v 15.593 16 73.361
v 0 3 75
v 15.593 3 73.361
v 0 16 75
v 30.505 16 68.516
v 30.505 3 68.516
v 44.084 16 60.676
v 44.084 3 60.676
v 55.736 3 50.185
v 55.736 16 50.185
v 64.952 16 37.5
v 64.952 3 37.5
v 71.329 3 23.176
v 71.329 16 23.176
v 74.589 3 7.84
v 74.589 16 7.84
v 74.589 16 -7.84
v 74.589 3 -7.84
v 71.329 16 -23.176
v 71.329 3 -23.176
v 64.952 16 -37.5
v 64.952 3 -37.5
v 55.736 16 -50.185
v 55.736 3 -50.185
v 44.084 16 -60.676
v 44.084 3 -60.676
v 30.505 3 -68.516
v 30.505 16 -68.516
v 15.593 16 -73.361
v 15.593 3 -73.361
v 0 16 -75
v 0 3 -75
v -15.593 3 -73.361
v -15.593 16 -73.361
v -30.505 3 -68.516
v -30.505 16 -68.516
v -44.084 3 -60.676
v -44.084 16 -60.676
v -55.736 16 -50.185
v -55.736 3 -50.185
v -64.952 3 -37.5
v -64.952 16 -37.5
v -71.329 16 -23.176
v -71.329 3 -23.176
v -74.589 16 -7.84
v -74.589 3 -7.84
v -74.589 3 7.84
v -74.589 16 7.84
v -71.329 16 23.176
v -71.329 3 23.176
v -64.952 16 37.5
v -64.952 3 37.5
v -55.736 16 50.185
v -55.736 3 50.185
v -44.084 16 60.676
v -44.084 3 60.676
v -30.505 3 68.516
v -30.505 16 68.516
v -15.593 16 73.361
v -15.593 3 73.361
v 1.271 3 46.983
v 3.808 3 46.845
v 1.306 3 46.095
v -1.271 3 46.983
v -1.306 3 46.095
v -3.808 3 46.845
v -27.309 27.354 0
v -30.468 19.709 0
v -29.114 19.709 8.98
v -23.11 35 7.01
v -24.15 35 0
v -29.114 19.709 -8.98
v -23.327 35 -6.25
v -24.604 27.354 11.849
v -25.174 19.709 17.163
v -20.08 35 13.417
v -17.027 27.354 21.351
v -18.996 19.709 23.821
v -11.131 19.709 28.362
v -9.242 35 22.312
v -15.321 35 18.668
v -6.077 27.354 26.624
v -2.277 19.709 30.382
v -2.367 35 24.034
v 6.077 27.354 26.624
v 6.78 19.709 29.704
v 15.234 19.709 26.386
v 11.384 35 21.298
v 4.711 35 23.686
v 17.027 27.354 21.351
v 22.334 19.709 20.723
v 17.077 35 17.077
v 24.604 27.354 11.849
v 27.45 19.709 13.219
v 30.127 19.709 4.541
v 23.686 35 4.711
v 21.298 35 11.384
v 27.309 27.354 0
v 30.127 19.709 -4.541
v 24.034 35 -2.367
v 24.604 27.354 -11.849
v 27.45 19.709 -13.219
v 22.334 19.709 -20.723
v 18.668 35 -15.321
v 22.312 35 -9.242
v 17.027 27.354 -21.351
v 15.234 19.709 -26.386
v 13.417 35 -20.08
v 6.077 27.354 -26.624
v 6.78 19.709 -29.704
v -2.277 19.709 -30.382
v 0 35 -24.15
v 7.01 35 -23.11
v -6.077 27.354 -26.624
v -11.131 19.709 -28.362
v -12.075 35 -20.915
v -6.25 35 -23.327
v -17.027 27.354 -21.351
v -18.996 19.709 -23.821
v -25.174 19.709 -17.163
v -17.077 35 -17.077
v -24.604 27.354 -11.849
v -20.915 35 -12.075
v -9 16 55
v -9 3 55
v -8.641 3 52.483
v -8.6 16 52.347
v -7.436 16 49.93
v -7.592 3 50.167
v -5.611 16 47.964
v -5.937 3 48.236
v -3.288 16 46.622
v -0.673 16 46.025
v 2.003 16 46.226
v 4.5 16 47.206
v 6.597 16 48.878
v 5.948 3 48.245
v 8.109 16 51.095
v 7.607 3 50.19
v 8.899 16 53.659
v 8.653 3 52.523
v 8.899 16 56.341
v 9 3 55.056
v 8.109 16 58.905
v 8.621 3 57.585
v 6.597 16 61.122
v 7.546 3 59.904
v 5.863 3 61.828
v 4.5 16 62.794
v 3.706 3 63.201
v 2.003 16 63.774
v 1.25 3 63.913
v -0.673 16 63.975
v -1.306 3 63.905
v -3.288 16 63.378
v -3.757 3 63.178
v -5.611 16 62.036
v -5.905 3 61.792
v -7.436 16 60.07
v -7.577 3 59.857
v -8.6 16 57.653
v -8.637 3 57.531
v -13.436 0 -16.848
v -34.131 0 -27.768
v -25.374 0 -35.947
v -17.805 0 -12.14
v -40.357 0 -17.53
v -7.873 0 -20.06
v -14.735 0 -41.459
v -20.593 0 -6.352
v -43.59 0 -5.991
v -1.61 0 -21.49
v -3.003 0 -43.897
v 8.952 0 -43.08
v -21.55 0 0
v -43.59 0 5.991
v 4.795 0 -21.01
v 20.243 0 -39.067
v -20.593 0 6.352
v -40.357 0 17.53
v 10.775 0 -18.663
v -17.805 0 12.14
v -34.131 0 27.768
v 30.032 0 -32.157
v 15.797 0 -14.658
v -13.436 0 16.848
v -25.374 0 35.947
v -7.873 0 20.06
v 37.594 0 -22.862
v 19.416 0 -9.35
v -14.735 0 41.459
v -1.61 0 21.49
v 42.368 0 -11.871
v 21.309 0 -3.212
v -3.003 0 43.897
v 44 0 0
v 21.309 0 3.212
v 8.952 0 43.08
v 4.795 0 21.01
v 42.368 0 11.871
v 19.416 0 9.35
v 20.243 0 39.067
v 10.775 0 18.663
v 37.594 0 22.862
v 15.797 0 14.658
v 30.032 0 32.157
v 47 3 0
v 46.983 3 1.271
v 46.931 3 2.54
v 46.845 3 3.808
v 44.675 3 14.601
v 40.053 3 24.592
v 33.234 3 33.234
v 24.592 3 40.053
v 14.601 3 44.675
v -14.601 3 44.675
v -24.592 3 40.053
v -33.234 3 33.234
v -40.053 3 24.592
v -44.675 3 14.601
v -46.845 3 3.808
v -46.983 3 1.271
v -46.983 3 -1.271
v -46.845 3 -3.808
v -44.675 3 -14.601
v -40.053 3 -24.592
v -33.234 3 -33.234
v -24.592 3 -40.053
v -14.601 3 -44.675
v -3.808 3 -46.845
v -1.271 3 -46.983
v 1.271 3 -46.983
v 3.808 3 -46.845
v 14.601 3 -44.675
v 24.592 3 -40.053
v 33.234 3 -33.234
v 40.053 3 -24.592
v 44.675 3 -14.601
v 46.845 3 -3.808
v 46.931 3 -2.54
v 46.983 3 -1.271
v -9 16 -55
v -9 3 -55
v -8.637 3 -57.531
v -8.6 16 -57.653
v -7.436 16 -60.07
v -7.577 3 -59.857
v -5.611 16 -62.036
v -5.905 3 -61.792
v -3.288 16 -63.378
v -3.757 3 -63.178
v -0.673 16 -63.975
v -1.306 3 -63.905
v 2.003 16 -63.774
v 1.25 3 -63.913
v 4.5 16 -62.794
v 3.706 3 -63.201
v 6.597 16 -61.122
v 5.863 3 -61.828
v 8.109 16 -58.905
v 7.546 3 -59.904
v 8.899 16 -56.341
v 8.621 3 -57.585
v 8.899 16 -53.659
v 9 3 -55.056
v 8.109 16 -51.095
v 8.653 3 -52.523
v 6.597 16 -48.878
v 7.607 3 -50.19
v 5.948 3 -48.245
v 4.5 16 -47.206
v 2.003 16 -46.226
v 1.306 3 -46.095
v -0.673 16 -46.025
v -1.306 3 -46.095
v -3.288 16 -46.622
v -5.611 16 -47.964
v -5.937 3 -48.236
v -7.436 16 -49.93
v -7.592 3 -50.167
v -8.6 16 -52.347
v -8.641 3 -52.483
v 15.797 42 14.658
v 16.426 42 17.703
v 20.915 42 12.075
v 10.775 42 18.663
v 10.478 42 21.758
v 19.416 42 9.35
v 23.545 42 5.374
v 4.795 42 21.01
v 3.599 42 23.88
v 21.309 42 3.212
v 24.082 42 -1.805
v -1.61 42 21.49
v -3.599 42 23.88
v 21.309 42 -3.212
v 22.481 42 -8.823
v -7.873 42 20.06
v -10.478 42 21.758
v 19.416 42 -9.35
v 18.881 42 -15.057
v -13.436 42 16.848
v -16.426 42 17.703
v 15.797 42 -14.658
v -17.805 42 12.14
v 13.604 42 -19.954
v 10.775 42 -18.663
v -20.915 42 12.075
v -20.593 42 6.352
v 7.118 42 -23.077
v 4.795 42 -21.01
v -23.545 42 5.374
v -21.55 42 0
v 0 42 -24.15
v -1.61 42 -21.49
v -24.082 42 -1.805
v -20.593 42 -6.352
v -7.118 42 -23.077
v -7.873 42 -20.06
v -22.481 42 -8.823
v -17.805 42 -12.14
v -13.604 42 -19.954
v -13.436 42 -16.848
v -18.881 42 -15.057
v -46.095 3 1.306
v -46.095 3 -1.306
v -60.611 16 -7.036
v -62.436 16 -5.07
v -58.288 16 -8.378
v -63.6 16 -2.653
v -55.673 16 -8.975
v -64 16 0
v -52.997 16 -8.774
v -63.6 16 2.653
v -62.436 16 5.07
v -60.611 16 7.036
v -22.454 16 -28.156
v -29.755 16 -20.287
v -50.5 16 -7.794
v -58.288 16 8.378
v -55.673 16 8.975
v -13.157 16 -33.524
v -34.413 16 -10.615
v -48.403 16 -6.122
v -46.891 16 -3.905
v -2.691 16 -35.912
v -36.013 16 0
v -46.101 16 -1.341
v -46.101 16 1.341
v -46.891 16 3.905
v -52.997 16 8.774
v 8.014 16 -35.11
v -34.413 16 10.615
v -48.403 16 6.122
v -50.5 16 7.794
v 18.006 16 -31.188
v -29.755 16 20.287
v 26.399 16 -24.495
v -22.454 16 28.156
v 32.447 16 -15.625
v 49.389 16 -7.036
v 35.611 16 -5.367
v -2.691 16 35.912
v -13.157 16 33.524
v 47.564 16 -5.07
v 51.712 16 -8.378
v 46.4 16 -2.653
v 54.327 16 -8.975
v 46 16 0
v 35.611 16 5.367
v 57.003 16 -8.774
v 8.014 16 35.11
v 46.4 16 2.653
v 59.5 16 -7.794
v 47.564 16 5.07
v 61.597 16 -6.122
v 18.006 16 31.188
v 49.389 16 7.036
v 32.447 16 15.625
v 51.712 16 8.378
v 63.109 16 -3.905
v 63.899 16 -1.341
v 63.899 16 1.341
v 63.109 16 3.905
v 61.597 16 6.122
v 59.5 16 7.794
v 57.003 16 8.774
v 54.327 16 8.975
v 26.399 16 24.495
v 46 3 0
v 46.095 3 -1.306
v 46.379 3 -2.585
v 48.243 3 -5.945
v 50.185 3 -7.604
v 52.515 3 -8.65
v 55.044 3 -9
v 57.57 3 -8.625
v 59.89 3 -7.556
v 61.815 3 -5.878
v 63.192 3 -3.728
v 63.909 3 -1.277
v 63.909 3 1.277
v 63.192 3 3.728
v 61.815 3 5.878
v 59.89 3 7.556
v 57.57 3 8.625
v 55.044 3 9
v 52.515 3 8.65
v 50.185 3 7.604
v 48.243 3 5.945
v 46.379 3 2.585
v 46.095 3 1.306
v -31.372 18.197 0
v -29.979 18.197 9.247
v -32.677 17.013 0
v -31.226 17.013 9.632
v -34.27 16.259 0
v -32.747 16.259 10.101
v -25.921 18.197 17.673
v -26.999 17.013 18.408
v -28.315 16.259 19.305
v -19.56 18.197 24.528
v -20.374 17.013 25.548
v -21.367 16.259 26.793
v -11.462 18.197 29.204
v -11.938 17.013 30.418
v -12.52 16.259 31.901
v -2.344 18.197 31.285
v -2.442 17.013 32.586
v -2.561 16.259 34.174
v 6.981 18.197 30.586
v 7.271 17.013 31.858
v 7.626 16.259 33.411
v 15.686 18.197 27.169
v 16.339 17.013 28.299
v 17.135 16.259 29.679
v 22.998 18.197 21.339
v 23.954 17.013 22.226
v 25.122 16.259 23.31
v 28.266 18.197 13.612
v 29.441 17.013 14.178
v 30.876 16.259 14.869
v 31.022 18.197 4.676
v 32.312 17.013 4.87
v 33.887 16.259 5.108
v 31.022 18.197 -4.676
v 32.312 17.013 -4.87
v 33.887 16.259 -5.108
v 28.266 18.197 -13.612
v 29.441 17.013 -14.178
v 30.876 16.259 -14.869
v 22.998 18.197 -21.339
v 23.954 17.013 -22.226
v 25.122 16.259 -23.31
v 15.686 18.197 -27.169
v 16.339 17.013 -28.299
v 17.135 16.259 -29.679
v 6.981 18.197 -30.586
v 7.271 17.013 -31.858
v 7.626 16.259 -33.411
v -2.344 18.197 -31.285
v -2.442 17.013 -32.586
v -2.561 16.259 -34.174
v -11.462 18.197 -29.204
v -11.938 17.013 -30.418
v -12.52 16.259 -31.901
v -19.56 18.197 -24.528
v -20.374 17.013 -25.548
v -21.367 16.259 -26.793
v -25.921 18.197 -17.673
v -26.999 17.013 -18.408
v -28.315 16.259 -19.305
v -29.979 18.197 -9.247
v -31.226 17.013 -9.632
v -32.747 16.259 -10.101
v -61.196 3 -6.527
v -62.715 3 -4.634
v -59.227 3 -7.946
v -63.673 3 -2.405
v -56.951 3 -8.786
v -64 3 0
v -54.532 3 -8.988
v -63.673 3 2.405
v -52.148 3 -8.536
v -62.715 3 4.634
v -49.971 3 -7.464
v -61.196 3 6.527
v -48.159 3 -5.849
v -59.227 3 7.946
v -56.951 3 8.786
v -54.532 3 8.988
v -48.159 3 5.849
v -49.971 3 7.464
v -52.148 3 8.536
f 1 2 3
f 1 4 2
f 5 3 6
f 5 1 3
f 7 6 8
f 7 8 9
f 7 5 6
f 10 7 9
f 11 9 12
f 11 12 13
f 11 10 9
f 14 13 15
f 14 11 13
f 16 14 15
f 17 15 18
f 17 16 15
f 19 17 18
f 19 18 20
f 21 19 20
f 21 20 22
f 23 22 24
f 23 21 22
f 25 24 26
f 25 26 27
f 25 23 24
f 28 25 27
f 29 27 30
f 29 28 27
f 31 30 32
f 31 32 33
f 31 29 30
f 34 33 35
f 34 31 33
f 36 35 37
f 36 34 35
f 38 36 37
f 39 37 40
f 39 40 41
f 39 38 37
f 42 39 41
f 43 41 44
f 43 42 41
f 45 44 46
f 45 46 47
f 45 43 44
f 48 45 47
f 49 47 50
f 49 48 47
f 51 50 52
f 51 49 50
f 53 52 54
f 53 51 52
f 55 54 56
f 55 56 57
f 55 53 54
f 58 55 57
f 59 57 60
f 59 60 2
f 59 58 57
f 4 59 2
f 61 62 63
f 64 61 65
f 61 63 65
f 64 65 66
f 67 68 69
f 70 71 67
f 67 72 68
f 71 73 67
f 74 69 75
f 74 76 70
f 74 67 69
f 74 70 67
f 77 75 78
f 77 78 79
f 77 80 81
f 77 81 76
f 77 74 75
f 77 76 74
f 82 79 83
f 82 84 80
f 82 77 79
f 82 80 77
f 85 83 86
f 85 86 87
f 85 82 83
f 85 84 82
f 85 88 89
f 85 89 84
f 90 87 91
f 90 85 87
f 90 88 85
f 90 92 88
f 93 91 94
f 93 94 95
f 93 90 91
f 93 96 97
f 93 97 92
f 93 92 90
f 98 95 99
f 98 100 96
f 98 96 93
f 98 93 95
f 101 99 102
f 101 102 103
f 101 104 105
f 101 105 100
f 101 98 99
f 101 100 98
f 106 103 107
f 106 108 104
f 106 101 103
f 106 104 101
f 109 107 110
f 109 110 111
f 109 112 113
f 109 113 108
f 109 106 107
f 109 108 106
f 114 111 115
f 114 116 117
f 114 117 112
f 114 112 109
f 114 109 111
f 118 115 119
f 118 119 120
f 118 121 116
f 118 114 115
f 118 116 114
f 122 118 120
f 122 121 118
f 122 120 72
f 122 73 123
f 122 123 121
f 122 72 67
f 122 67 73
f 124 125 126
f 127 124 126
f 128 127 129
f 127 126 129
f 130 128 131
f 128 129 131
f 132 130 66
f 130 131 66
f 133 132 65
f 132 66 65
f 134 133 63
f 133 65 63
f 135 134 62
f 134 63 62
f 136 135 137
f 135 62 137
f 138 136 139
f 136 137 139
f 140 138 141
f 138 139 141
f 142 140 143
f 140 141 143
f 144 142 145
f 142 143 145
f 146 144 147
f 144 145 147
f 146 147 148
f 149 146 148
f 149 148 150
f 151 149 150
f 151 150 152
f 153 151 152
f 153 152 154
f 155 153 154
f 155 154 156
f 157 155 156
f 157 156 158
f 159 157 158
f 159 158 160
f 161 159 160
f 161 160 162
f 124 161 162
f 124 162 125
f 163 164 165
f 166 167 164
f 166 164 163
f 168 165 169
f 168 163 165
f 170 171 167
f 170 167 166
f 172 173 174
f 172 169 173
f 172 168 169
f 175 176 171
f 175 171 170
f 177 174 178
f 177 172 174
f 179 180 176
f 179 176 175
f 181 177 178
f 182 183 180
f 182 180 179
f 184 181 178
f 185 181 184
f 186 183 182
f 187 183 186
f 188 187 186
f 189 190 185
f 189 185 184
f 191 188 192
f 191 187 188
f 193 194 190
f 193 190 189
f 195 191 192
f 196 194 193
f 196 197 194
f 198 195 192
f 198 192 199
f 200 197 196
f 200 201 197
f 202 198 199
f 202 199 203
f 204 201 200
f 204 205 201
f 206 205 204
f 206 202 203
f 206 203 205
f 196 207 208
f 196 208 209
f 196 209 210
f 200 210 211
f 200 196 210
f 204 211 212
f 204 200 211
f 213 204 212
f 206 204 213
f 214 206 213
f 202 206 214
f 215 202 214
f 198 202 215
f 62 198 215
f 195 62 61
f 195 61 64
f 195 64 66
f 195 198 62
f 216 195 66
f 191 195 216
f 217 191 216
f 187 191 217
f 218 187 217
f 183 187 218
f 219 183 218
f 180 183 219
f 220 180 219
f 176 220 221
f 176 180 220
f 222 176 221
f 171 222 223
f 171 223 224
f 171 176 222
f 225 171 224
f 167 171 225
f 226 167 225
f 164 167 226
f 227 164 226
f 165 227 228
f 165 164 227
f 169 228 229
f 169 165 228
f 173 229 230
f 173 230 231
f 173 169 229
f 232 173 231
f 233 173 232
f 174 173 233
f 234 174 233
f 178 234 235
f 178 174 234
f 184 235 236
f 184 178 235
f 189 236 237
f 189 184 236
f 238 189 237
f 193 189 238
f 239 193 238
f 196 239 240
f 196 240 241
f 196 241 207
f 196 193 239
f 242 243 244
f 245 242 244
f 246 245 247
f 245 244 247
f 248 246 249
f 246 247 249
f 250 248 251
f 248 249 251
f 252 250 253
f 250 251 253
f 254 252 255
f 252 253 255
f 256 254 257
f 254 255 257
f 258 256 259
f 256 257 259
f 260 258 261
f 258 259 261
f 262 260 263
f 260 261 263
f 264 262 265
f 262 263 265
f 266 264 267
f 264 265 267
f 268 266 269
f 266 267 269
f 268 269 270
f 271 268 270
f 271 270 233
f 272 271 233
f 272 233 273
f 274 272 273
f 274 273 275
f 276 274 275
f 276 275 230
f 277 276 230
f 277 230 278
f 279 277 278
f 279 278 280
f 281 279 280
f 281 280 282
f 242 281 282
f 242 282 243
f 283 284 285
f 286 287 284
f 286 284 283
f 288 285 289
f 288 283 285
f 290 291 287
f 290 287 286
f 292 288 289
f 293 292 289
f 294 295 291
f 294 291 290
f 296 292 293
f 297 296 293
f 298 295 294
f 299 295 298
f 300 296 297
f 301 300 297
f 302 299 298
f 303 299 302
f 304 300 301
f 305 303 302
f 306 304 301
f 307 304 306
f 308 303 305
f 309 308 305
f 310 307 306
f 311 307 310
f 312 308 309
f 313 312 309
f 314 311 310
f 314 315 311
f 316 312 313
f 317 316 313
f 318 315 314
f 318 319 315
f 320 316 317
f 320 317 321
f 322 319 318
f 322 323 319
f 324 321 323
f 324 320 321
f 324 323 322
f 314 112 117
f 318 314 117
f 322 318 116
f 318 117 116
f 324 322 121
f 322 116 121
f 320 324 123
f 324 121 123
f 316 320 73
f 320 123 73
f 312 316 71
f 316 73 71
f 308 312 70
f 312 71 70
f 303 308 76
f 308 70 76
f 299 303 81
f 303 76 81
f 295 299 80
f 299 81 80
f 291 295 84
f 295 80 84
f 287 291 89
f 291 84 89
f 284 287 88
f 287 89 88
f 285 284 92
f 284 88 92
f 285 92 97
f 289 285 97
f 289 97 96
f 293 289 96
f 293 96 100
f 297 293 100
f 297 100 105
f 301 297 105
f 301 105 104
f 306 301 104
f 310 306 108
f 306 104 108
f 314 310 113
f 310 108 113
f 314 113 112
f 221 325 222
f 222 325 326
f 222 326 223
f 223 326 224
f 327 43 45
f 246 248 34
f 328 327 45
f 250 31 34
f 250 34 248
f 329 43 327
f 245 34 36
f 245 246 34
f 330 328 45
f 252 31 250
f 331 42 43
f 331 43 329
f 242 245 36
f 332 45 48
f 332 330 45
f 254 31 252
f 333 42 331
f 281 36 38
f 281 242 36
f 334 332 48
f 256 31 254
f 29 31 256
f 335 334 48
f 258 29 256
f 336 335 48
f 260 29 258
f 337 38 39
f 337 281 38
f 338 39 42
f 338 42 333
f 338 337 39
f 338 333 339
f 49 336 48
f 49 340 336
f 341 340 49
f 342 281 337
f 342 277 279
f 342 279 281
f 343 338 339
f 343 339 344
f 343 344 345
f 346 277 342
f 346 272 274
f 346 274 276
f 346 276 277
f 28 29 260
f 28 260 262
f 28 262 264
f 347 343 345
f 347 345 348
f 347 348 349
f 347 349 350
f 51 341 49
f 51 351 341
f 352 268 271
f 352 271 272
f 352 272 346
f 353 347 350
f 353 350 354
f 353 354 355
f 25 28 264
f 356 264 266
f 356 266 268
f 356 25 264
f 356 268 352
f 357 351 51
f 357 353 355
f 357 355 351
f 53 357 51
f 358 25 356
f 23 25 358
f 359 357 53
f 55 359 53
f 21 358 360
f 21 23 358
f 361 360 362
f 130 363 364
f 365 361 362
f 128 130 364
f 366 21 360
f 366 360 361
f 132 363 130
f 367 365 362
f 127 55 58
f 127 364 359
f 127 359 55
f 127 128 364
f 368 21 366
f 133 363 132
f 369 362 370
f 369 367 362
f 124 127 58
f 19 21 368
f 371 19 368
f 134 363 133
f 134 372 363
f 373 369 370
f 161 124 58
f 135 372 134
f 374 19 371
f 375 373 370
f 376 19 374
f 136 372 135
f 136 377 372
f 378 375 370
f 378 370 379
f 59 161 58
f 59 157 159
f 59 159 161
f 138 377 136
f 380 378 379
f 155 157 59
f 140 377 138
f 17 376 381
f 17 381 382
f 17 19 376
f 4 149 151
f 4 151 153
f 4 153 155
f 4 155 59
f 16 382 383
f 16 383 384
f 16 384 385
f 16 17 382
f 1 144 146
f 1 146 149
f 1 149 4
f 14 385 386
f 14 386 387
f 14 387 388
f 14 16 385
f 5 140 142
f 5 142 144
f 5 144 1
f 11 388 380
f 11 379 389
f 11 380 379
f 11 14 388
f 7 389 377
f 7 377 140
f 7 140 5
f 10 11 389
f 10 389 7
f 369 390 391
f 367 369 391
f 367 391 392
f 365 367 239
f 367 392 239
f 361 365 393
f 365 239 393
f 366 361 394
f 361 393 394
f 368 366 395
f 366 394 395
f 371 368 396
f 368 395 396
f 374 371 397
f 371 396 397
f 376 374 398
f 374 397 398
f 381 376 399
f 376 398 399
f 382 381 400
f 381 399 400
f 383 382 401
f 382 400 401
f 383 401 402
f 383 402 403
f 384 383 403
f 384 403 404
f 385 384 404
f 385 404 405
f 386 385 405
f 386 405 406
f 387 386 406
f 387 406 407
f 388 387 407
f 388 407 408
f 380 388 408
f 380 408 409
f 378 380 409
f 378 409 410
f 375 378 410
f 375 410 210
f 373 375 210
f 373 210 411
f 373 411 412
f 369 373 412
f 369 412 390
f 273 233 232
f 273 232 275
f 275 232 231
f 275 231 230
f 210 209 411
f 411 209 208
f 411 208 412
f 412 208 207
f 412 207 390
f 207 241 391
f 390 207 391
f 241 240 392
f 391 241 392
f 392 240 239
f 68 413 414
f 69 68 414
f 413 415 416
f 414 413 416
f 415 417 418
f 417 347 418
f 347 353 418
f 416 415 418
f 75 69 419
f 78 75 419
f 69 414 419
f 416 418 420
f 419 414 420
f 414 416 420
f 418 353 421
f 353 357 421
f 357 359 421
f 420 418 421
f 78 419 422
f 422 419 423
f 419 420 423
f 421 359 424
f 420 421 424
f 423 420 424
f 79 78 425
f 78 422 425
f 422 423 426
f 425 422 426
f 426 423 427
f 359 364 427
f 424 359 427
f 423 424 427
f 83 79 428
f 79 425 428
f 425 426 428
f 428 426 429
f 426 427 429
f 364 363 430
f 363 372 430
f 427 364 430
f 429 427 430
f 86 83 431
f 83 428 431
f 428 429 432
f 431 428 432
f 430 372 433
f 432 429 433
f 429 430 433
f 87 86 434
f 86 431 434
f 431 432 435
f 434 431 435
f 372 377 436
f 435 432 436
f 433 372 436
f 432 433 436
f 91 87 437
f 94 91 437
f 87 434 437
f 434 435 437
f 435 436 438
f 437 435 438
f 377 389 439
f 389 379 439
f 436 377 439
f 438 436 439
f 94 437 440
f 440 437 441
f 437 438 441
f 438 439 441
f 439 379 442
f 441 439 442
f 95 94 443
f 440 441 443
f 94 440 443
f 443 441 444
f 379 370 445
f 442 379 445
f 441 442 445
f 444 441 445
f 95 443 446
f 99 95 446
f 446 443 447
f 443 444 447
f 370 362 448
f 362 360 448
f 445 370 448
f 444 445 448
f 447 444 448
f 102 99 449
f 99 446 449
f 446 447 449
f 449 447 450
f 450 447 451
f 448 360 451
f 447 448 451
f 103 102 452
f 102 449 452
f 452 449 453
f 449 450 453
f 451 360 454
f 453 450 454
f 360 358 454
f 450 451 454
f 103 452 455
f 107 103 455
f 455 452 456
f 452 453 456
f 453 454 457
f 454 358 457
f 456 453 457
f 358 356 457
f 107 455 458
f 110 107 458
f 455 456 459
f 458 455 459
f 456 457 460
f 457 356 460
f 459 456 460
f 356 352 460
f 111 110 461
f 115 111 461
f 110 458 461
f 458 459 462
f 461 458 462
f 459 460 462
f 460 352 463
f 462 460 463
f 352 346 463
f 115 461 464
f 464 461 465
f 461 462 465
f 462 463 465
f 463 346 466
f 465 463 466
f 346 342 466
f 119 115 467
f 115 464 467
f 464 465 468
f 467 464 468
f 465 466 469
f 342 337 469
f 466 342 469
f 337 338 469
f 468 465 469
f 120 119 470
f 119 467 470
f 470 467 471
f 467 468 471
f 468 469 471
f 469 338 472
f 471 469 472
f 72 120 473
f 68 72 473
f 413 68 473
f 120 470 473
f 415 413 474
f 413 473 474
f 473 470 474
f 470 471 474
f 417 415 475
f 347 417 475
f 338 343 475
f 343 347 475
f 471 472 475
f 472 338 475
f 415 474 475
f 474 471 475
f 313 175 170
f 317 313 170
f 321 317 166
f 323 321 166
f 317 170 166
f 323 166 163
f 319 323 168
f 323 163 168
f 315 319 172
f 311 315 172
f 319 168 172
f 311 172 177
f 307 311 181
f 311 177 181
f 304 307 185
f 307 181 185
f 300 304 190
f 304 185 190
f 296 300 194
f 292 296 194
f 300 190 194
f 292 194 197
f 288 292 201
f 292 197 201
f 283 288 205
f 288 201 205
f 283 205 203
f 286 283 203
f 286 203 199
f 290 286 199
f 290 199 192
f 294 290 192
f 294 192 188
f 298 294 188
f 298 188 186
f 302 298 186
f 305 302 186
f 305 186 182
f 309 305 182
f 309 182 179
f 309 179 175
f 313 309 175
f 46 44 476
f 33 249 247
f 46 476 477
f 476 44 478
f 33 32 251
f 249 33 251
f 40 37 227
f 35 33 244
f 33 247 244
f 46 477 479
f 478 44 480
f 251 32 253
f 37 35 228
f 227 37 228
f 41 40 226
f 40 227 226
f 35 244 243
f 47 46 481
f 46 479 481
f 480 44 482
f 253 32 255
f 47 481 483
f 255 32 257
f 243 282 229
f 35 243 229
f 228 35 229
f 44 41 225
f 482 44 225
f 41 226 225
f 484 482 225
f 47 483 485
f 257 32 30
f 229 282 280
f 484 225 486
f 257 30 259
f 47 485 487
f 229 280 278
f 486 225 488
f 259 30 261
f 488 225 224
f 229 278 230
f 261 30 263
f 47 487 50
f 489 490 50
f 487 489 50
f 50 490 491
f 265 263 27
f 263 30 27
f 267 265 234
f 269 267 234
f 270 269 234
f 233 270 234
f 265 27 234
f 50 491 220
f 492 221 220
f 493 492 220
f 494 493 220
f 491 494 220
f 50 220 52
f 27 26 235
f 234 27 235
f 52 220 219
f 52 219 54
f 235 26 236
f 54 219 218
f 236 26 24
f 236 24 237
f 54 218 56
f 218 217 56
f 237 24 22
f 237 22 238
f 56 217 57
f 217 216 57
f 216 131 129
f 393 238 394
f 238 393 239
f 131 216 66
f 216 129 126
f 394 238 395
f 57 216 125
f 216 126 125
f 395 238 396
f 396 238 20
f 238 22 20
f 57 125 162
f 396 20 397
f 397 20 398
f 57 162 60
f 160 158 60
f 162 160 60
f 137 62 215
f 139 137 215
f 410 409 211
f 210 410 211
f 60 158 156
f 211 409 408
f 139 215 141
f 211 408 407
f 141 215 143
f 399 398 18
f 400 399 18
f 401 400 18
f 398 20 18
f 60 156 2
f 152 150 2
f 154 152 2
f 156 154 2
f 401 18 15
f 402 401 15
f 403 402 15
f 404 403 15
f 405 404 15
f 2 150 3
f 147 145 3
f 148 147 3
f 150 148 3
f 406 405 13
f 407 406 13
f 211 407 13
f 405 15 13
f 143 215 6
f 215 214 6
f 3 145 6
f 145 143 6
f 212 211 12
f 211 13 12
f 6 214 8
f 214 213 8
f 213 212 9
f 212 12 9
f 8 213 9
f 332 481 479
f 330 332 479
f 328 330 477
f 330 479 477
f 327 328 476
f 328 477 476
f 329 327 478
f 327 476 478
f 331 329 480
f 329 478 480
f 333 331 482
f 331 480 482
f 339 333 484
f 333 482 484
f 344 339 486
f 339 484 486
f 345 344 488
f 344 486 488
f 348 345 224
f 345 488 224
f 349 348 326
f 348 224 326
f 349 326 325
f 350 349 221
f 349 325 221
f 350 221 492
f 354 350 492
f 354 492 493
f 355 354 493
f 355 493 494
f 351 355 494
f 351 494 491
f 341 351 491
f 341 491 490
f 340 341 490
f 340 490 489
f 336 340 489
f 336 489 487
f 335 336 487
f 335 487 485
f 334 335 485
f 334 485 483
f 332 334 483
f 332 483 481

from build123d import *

# Parameters (mm, degrees)
SZKIC1_W                    = 75
SZKIC1_H                    = 13
SZKIC2_R                    = 32
DODANIE_WYCI_GNI_CIE1_DEPTH = 19
DODANIE_WYCI_GNI_CIE1_TAPER = 22.448353305
SZKIC3_R                    = 24.15
DODANIE_WYCI_GNI_CIE2_DEPTH = 7
SZKIC4_R                    = 47
DODANIE_WYCI_GNI_CIE3_DEPTH = 3
DODANIE_WYCI_GNI_CIE3_TAPER = 45
OTW_R_18_0_18_1_D           = 18
OTW_R_18_0_18_1_DEPTH       = 13
OTW_R_POD_RUB_M391_D        = 43.1
ZAOKR_GLENIE1_R             = 6


with BuildPart() as part:
    # Szkic1 → Obrót1 (revolve)
    with BuildSketch(Plane(origin=(0, 0, 0), x_dir=(-1, 0, 0), z_dir=(0, 0, -1)), mode=Mode.PRIVATE) as obr_t1_sk:
        with Locations((-37.5, 9.5)):
            Rectangle(SZKIC1_W, SZKIC1_H)
    revolve(obr_t1_sk.sketch.rotate(Axis((0, 3, 0), (0, 1, 0)), 270), axis=Axis((0, 3, 0), (0, 1, 0)))

    # Szkic2 → Dodanie-wyciągnięcie1 (add)
    with BuildSketch(Plane(origin=(0, 16, 0), x_dir=(-1, 0, 0), z_dir=(0, 1, 0))):
        Circle(SZKIC2_R)
    extrude(amount=DODANIE_WYCI_GNI_CIE1_DEPTH, taper=DODANIE_WYCI_GNI_CIE1_TAPER)

    # Szkic3 → Dodanie-wyciągnięcie2 (add)
    with BuildSketch(Plane(origin=(0, 35, 0), x_dir=(-1, 0, 0), z_dir=(0, 1, 0))):
        with Locations(Location((0, 0, 0), (0, 0, 270))):
            Circle(SZKIC3_R)
    extrude(amount=DODANIE_WYCI_GNI_CIE2_DEPTH)

    # Szkic4 → Dodanie-wyciągnięcie3 (add)
    with BuildSketch(Plane.XZ.offset(-3)):
        Circle(SZKIC4_R)
    extrude(amount=DODANIE_WYCI_GNI_CIE3_DEPTH, taper=DODANIE_WYCI_GNI_CIE3_TAPER)

    # Otwór Ø18.0 (18)1
    with Locations(Plane(origin=(0, 16, 0), x_dir=(1, 0, 0), z_dir=(0, 1, 0))):
        with Locations((-55, 0), (55, 0), (0, -55), (0, 55)):
            Hole(OTW_R_18_0_18_1_D / 2, depth=OTW_R_18_0_18_1_DEPTH)

    # Otwór pod śrubę M391 (through all)
    with Locations(Plane(origin=(0, 42, 0), x_dir=(1, 0, 0), z_dir=(0, 1, 0))):
        with Locations((0, 0)):
            Hole(OTW_R_POD_RUB_M391_D / 2)

    # Zaokrąglenie1
    zaokr_glenie1_edges = [part.edges().sort_by_distance(p)[0] for p in [
        (32, 16, 0),
    ]]
    fillet(zaokr_glenie1_edges, radius=ZAOKR_GLENIE1_R)


solid = part.part
